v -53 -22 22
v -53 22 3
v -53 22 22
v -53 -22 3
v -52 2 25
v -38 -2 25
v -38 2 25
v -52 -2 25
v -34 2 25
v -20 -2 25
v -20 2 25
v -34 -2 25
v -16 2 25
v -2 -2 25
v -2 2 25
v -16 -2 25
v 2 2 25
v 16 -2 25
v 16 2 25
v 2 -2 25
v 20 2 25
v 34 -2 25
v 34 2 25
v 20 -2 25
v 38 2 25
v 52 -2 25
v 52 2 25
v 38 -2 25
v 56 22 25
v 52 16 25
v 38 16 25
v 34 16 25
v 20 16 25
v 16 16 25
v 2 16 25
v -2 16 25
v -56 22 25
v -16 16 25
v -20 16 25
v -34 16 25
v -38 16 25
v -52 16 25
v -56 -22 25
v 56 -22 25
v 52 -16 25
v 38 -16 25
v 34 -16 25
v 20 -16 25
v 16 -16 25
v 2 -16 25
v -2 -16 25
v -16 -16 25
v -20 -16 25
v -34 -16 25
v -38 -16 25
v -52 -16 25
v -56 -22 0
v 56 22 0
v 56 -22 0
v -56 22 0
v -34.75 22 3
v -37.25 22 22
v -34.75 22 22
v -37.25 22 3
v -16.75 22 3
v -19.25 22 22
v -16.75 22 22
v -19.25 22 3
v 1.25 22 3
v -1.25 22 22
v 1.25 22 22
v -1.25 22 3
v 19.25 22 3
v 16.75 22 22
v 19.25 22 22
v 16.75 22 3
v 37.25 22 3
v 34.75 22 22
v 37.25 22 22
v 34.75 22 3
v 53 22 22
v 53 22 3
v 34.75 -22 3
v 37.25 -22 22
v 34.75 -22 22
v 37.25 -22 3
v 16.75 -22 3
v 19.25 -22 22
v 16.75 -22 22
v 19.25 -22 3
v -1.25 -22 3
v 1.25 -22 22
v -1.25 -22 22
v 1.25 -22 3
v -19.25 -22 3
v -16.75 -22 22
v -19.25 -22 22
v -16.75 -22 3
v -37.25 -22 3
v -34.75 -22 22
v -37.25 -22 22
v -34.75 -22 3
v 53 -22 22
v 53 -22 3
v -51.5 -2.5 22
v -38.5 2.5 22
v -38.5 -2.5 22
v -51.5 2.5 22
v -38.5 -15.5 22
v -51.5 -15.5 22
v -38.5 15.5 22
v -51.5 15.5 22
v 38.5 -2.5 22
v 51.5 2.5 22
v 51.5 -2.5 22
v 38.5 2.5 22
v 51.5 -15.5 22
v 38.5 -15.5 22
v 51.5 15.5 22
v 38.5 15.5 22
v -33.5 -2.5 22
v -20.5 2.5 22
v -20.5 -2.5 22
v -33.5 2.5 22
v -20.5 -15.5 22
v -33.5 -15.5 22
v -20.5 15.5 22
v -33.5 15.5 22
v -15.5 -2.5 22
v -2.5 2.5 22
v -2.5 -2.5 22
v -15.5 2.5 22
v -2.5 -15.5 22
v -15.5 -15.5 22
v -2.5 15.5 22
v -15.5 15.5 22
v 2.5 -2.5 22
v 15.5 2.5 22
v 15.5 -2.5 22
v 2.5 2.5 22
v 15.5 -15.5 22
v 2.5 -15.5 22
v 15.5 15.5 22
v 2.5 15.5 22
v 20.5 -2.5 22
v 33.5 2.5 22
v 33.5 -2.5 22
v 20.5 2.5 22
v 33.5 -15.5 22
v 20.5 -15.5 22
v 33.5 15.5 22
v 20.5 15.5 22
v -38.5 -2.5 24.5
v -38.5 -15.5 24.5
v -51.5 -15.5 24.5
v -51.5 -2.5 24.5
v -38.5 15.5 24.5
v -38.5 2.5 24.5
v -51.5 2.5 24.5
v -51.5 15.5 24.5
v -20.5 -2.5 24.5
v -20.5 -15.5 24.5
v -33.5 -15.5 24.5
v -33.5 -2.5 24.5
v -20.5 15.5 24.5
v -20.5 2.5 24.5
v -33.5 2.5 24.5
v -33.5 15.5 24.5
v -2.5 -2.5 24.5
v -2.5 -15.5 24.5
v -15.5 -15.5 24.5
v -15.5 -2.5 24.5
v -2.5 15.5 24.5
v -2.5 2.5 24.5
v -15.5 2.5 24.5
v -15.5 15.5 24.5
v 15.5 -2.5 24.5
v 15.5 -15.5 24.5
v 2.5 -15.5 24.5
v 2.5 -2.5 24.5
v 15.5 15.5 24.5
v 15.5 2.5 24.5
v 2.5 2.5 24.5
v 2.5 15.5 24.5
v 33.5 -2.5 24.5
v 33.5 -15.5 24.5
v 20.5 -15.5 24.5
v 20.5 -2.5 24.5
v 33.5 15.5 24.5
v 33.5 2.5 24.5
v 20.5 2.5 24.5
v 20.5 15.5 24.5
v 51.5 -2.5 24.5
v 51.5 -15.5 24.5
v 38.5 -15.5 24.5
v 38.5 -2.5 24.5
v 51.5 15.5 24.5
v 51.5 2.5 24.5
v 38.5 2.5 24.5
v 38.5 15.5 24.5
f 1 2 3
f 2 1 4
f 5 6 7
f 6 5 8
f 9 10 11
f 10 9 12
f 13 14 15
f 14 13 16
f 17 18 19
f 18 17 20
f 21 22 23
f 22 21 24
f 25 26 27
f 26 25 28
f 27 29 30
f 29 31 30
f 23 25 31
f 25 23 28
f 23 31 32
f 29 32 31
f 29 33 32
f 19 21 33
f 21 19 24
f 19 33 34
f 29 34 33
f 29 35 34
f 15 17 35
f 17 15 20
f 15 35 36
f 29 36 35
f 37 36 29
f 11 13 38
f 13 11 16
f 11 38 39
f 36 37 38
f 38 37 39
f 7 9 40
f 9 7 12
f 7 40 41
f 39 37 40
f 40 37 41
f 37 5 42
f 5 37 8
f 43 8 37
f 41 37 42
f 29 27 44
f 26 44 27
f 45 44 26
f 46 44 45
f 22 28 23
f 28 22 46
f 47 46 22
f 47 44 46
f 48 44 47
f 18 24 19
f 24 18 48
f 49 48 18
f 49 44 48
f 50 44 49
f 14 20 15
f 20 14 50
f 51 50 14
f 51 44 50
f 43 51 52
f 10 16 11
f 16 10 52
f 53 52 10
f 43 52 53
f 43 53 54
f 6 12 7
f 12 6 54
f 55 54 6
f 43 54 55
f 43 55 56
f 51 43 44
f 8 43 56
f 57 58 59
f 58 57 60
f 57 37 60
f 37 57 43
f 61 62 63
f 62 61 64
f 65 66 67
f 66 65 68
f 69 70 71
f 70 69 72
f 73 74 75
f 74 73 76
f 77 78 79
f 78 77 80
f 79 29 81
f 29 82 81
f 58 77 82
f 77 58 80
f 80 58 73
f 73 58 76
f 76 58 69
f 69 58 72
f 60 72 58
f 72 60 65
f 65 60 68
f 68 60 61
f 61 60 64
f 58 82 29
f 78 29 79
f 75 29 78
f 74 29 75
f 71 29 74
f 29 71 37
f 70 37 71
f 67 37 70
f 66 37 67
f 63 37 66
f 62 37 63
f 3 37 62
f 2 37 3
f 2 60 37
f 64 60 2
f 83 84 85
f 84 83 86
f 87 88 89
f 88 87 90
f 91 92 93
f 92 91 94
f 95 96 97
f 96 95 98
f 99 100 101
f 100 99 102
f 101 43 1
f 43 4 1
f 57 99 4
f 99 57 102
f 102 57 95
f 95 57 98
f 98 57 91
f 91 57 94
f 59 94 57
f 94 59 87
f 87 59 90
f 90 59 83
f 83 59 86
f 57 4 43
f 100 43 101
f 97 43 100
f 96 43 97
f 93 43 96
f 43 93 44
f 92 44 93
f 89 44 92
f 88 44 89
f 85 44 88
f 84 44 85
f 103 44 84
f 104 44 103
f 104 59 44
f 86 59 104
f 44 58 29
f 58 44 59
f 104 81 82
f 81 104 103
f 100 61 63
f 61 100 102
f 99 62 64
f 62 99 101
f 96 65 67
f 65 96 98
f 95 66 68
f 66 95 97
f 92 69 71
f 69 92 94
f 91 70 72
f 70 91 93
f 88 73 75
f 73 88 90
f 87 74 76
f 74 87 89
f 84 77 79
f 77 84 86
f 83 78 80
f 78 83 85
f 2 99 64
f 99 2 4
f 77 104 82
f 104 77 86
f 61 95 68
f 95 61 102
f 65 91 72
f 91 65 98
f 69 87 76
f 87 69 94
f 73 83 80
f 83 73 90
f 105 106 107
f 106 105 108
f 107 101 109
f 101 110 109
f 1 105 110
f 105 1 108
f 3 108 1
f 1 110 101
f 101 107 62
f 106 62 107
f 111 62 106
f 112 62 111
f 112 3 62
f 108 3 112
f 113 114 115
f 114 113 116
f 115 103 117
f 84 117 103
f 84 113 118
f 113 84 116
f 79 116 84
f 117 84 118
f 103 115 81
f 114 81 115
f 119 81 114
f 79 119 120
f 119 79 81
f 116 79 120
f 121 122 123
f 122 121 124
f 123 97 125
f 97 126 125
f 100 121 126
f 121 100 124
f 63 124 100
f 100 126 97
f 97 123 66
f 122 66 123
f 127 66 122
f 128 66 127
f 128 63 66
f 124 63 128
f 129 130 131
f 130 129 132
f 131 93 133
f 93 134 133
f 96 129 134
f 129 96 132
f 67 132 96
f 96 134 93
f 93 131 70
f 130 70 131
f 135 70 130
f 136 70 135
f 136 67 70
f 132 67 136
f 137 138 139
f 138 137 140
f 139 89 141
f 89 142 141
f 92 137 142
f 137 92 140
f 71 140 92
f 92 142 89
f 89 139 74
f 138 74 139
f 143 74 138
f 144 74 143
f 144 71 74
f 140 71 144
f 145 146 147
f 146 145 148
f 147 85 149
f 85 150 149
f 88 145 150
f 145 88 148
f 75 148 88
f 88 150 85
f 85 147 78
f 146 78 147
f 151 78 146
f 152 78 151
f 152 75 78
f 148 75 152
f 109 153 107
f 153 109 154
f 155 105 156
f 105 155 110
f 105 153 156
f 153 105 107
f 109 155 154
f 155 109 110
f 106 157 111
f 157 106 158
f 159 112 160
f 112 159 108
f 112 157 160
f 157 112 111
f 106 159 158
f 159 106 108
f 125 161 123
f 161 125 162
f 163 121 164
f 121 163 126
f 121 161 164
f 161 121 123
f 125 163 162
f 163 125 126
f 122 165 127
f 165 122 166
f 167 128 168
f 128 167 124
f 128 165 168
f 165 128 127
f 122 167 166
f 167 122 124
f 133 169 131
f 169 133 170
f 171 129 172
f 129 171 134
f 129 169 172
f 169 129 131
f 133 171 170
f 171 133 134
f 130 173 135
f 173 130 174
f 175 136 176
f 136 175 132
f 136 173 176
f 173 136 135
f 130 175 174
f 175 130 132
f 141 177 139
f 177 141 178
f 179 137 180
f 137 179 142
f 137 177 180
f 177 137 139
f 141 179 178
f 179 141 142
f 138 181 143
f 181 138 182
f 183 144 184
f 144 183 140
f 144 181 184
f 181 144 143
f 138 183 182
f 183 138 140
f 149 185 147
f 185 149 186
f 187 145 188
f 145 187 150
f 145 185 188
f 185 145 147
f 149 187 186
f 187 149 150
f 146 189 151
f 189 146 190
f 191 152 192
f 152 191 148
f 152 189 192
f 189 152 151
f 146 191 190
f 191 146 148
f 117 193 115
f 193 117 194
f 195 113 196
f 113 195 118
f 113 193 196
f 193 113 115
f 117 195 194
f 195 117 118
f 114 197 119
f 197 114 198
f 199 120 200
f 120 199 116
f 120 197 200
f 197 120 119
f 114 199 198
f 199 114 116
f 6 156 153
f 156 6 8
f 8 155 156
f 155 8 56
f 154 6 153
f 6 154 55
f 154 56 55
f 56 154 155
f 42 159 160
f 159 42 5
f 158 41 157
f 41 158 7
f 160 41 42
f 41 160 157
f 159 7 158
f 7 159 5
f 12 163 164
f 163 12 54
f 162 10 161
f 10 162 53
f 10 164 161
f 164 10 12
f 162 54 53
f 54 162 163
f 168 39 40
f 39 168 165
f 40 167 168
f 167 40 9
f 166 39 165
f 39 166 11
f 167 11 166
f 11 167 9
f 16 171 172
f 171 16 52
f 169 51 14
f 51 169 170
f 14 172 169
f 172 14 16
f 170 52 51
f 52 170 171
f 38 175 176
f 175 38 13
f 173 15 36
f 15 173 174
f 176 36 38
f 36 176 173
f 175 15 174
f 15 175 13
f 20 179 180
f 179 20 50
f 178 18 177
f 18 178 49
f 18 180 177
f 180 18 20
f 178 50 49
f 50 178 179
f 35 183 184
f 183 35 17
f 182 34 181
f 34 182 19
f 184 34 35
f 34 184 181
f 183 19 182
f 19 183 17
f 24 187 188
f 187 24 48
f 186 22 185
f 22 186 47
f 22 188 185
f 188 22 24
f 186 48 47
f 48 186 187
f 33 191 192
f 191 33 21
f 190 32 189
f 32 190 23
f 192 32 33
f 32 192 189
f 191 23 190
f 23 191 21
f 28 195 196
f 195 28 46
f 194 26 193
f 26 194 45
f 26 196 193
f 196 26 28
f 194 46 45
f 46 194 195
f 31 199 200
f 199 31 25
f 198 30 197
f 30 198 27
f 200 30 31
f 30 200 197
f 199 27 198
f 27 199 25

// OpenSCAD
// KNOWN-RIGHT ALTERNATIVE (must pass): a correct rack whose deck holes have 0.5 mm lead-in chamfers at the top
// Open-sided rack for 12 standard 12.5 mm square cuvettes (2 rows of 6)
// Category: benchware. A base plate and a perforated deck joined by seven upright walls that run
// front to back; the long sides stay open, so the cuvettes can be seen and read in the rack.
// The deck bridges only 15.5 mm between walls, so it prints without supports.
// Print: PLA or PETG, base on the bed, 0.2 mm layers.
// SPDX-License-Identifier: CERN-OHL-P-2.0

/* [Rack] */
plate = [112, 44];        // X, Y of the base plate and the deck [mm]
base_t = 3;               // base plate z = 0 .. 3
deck_z = 22;              // deck from z = 22 ...
deck_t = 3;               // ... to z = 25
end_t = 3;                // end walls, flush with the short ends
rib_t = 2.5;              // inner ribs
rib_x = [-36, -18, 0, 18, 36];
cols = 6;                 // holes along X
rows = 2;                 // holes along Y
pitch = 18;               // centre-to-centre in X and Y
hole = 13;                // square hole for a 12.5 mm cuvette

/* [Hidden] */
eps = 0.01;
H = deck_z + deck_t;

difference() {
    union() {
        translate([-plate.x / 2, -plate.y / 2, 0]) cube([plate.x, plate.y, base_t]);
        translate([-plate.x / 2, -plate.y / 2, deck_z]) cube([plate.x, plate.y, deck_t]);
        for (s = [-1, 1])
            translate([s > 0 ? plate.x / 2 - end_t : -plate.x / 2, -plate.y / 2, 0]) cube([end_t, plate.y, H]);
        for (x = rib_x)
            translate([x - rib_t / 2, -plate.y / 2, 0]) cube([rib_t, plate.y, H]);
    }
    for (i = [0 : cols - 1], j = [0 : rows - 1])
        translate([(i - (cols - 1) / 2) * pitch - hole / 2, (j - (rows - 1) / 2) * pitch - hole / 2, deck_z - eps])
            cube([hole, hole, deck_t + 2 * eps]);
    for (i = [0 : cols - 1], j = [0 : rows - 1])
        translate([(i - (cols - 1) / 2) * pitch, (j - (rows - 1) / 2) * pitch, H - 0.5])
            linear_extrude(0.5 + eps, scale = (hole + 1 + 2 * eps) / hole) square(hole, center = true);
}
